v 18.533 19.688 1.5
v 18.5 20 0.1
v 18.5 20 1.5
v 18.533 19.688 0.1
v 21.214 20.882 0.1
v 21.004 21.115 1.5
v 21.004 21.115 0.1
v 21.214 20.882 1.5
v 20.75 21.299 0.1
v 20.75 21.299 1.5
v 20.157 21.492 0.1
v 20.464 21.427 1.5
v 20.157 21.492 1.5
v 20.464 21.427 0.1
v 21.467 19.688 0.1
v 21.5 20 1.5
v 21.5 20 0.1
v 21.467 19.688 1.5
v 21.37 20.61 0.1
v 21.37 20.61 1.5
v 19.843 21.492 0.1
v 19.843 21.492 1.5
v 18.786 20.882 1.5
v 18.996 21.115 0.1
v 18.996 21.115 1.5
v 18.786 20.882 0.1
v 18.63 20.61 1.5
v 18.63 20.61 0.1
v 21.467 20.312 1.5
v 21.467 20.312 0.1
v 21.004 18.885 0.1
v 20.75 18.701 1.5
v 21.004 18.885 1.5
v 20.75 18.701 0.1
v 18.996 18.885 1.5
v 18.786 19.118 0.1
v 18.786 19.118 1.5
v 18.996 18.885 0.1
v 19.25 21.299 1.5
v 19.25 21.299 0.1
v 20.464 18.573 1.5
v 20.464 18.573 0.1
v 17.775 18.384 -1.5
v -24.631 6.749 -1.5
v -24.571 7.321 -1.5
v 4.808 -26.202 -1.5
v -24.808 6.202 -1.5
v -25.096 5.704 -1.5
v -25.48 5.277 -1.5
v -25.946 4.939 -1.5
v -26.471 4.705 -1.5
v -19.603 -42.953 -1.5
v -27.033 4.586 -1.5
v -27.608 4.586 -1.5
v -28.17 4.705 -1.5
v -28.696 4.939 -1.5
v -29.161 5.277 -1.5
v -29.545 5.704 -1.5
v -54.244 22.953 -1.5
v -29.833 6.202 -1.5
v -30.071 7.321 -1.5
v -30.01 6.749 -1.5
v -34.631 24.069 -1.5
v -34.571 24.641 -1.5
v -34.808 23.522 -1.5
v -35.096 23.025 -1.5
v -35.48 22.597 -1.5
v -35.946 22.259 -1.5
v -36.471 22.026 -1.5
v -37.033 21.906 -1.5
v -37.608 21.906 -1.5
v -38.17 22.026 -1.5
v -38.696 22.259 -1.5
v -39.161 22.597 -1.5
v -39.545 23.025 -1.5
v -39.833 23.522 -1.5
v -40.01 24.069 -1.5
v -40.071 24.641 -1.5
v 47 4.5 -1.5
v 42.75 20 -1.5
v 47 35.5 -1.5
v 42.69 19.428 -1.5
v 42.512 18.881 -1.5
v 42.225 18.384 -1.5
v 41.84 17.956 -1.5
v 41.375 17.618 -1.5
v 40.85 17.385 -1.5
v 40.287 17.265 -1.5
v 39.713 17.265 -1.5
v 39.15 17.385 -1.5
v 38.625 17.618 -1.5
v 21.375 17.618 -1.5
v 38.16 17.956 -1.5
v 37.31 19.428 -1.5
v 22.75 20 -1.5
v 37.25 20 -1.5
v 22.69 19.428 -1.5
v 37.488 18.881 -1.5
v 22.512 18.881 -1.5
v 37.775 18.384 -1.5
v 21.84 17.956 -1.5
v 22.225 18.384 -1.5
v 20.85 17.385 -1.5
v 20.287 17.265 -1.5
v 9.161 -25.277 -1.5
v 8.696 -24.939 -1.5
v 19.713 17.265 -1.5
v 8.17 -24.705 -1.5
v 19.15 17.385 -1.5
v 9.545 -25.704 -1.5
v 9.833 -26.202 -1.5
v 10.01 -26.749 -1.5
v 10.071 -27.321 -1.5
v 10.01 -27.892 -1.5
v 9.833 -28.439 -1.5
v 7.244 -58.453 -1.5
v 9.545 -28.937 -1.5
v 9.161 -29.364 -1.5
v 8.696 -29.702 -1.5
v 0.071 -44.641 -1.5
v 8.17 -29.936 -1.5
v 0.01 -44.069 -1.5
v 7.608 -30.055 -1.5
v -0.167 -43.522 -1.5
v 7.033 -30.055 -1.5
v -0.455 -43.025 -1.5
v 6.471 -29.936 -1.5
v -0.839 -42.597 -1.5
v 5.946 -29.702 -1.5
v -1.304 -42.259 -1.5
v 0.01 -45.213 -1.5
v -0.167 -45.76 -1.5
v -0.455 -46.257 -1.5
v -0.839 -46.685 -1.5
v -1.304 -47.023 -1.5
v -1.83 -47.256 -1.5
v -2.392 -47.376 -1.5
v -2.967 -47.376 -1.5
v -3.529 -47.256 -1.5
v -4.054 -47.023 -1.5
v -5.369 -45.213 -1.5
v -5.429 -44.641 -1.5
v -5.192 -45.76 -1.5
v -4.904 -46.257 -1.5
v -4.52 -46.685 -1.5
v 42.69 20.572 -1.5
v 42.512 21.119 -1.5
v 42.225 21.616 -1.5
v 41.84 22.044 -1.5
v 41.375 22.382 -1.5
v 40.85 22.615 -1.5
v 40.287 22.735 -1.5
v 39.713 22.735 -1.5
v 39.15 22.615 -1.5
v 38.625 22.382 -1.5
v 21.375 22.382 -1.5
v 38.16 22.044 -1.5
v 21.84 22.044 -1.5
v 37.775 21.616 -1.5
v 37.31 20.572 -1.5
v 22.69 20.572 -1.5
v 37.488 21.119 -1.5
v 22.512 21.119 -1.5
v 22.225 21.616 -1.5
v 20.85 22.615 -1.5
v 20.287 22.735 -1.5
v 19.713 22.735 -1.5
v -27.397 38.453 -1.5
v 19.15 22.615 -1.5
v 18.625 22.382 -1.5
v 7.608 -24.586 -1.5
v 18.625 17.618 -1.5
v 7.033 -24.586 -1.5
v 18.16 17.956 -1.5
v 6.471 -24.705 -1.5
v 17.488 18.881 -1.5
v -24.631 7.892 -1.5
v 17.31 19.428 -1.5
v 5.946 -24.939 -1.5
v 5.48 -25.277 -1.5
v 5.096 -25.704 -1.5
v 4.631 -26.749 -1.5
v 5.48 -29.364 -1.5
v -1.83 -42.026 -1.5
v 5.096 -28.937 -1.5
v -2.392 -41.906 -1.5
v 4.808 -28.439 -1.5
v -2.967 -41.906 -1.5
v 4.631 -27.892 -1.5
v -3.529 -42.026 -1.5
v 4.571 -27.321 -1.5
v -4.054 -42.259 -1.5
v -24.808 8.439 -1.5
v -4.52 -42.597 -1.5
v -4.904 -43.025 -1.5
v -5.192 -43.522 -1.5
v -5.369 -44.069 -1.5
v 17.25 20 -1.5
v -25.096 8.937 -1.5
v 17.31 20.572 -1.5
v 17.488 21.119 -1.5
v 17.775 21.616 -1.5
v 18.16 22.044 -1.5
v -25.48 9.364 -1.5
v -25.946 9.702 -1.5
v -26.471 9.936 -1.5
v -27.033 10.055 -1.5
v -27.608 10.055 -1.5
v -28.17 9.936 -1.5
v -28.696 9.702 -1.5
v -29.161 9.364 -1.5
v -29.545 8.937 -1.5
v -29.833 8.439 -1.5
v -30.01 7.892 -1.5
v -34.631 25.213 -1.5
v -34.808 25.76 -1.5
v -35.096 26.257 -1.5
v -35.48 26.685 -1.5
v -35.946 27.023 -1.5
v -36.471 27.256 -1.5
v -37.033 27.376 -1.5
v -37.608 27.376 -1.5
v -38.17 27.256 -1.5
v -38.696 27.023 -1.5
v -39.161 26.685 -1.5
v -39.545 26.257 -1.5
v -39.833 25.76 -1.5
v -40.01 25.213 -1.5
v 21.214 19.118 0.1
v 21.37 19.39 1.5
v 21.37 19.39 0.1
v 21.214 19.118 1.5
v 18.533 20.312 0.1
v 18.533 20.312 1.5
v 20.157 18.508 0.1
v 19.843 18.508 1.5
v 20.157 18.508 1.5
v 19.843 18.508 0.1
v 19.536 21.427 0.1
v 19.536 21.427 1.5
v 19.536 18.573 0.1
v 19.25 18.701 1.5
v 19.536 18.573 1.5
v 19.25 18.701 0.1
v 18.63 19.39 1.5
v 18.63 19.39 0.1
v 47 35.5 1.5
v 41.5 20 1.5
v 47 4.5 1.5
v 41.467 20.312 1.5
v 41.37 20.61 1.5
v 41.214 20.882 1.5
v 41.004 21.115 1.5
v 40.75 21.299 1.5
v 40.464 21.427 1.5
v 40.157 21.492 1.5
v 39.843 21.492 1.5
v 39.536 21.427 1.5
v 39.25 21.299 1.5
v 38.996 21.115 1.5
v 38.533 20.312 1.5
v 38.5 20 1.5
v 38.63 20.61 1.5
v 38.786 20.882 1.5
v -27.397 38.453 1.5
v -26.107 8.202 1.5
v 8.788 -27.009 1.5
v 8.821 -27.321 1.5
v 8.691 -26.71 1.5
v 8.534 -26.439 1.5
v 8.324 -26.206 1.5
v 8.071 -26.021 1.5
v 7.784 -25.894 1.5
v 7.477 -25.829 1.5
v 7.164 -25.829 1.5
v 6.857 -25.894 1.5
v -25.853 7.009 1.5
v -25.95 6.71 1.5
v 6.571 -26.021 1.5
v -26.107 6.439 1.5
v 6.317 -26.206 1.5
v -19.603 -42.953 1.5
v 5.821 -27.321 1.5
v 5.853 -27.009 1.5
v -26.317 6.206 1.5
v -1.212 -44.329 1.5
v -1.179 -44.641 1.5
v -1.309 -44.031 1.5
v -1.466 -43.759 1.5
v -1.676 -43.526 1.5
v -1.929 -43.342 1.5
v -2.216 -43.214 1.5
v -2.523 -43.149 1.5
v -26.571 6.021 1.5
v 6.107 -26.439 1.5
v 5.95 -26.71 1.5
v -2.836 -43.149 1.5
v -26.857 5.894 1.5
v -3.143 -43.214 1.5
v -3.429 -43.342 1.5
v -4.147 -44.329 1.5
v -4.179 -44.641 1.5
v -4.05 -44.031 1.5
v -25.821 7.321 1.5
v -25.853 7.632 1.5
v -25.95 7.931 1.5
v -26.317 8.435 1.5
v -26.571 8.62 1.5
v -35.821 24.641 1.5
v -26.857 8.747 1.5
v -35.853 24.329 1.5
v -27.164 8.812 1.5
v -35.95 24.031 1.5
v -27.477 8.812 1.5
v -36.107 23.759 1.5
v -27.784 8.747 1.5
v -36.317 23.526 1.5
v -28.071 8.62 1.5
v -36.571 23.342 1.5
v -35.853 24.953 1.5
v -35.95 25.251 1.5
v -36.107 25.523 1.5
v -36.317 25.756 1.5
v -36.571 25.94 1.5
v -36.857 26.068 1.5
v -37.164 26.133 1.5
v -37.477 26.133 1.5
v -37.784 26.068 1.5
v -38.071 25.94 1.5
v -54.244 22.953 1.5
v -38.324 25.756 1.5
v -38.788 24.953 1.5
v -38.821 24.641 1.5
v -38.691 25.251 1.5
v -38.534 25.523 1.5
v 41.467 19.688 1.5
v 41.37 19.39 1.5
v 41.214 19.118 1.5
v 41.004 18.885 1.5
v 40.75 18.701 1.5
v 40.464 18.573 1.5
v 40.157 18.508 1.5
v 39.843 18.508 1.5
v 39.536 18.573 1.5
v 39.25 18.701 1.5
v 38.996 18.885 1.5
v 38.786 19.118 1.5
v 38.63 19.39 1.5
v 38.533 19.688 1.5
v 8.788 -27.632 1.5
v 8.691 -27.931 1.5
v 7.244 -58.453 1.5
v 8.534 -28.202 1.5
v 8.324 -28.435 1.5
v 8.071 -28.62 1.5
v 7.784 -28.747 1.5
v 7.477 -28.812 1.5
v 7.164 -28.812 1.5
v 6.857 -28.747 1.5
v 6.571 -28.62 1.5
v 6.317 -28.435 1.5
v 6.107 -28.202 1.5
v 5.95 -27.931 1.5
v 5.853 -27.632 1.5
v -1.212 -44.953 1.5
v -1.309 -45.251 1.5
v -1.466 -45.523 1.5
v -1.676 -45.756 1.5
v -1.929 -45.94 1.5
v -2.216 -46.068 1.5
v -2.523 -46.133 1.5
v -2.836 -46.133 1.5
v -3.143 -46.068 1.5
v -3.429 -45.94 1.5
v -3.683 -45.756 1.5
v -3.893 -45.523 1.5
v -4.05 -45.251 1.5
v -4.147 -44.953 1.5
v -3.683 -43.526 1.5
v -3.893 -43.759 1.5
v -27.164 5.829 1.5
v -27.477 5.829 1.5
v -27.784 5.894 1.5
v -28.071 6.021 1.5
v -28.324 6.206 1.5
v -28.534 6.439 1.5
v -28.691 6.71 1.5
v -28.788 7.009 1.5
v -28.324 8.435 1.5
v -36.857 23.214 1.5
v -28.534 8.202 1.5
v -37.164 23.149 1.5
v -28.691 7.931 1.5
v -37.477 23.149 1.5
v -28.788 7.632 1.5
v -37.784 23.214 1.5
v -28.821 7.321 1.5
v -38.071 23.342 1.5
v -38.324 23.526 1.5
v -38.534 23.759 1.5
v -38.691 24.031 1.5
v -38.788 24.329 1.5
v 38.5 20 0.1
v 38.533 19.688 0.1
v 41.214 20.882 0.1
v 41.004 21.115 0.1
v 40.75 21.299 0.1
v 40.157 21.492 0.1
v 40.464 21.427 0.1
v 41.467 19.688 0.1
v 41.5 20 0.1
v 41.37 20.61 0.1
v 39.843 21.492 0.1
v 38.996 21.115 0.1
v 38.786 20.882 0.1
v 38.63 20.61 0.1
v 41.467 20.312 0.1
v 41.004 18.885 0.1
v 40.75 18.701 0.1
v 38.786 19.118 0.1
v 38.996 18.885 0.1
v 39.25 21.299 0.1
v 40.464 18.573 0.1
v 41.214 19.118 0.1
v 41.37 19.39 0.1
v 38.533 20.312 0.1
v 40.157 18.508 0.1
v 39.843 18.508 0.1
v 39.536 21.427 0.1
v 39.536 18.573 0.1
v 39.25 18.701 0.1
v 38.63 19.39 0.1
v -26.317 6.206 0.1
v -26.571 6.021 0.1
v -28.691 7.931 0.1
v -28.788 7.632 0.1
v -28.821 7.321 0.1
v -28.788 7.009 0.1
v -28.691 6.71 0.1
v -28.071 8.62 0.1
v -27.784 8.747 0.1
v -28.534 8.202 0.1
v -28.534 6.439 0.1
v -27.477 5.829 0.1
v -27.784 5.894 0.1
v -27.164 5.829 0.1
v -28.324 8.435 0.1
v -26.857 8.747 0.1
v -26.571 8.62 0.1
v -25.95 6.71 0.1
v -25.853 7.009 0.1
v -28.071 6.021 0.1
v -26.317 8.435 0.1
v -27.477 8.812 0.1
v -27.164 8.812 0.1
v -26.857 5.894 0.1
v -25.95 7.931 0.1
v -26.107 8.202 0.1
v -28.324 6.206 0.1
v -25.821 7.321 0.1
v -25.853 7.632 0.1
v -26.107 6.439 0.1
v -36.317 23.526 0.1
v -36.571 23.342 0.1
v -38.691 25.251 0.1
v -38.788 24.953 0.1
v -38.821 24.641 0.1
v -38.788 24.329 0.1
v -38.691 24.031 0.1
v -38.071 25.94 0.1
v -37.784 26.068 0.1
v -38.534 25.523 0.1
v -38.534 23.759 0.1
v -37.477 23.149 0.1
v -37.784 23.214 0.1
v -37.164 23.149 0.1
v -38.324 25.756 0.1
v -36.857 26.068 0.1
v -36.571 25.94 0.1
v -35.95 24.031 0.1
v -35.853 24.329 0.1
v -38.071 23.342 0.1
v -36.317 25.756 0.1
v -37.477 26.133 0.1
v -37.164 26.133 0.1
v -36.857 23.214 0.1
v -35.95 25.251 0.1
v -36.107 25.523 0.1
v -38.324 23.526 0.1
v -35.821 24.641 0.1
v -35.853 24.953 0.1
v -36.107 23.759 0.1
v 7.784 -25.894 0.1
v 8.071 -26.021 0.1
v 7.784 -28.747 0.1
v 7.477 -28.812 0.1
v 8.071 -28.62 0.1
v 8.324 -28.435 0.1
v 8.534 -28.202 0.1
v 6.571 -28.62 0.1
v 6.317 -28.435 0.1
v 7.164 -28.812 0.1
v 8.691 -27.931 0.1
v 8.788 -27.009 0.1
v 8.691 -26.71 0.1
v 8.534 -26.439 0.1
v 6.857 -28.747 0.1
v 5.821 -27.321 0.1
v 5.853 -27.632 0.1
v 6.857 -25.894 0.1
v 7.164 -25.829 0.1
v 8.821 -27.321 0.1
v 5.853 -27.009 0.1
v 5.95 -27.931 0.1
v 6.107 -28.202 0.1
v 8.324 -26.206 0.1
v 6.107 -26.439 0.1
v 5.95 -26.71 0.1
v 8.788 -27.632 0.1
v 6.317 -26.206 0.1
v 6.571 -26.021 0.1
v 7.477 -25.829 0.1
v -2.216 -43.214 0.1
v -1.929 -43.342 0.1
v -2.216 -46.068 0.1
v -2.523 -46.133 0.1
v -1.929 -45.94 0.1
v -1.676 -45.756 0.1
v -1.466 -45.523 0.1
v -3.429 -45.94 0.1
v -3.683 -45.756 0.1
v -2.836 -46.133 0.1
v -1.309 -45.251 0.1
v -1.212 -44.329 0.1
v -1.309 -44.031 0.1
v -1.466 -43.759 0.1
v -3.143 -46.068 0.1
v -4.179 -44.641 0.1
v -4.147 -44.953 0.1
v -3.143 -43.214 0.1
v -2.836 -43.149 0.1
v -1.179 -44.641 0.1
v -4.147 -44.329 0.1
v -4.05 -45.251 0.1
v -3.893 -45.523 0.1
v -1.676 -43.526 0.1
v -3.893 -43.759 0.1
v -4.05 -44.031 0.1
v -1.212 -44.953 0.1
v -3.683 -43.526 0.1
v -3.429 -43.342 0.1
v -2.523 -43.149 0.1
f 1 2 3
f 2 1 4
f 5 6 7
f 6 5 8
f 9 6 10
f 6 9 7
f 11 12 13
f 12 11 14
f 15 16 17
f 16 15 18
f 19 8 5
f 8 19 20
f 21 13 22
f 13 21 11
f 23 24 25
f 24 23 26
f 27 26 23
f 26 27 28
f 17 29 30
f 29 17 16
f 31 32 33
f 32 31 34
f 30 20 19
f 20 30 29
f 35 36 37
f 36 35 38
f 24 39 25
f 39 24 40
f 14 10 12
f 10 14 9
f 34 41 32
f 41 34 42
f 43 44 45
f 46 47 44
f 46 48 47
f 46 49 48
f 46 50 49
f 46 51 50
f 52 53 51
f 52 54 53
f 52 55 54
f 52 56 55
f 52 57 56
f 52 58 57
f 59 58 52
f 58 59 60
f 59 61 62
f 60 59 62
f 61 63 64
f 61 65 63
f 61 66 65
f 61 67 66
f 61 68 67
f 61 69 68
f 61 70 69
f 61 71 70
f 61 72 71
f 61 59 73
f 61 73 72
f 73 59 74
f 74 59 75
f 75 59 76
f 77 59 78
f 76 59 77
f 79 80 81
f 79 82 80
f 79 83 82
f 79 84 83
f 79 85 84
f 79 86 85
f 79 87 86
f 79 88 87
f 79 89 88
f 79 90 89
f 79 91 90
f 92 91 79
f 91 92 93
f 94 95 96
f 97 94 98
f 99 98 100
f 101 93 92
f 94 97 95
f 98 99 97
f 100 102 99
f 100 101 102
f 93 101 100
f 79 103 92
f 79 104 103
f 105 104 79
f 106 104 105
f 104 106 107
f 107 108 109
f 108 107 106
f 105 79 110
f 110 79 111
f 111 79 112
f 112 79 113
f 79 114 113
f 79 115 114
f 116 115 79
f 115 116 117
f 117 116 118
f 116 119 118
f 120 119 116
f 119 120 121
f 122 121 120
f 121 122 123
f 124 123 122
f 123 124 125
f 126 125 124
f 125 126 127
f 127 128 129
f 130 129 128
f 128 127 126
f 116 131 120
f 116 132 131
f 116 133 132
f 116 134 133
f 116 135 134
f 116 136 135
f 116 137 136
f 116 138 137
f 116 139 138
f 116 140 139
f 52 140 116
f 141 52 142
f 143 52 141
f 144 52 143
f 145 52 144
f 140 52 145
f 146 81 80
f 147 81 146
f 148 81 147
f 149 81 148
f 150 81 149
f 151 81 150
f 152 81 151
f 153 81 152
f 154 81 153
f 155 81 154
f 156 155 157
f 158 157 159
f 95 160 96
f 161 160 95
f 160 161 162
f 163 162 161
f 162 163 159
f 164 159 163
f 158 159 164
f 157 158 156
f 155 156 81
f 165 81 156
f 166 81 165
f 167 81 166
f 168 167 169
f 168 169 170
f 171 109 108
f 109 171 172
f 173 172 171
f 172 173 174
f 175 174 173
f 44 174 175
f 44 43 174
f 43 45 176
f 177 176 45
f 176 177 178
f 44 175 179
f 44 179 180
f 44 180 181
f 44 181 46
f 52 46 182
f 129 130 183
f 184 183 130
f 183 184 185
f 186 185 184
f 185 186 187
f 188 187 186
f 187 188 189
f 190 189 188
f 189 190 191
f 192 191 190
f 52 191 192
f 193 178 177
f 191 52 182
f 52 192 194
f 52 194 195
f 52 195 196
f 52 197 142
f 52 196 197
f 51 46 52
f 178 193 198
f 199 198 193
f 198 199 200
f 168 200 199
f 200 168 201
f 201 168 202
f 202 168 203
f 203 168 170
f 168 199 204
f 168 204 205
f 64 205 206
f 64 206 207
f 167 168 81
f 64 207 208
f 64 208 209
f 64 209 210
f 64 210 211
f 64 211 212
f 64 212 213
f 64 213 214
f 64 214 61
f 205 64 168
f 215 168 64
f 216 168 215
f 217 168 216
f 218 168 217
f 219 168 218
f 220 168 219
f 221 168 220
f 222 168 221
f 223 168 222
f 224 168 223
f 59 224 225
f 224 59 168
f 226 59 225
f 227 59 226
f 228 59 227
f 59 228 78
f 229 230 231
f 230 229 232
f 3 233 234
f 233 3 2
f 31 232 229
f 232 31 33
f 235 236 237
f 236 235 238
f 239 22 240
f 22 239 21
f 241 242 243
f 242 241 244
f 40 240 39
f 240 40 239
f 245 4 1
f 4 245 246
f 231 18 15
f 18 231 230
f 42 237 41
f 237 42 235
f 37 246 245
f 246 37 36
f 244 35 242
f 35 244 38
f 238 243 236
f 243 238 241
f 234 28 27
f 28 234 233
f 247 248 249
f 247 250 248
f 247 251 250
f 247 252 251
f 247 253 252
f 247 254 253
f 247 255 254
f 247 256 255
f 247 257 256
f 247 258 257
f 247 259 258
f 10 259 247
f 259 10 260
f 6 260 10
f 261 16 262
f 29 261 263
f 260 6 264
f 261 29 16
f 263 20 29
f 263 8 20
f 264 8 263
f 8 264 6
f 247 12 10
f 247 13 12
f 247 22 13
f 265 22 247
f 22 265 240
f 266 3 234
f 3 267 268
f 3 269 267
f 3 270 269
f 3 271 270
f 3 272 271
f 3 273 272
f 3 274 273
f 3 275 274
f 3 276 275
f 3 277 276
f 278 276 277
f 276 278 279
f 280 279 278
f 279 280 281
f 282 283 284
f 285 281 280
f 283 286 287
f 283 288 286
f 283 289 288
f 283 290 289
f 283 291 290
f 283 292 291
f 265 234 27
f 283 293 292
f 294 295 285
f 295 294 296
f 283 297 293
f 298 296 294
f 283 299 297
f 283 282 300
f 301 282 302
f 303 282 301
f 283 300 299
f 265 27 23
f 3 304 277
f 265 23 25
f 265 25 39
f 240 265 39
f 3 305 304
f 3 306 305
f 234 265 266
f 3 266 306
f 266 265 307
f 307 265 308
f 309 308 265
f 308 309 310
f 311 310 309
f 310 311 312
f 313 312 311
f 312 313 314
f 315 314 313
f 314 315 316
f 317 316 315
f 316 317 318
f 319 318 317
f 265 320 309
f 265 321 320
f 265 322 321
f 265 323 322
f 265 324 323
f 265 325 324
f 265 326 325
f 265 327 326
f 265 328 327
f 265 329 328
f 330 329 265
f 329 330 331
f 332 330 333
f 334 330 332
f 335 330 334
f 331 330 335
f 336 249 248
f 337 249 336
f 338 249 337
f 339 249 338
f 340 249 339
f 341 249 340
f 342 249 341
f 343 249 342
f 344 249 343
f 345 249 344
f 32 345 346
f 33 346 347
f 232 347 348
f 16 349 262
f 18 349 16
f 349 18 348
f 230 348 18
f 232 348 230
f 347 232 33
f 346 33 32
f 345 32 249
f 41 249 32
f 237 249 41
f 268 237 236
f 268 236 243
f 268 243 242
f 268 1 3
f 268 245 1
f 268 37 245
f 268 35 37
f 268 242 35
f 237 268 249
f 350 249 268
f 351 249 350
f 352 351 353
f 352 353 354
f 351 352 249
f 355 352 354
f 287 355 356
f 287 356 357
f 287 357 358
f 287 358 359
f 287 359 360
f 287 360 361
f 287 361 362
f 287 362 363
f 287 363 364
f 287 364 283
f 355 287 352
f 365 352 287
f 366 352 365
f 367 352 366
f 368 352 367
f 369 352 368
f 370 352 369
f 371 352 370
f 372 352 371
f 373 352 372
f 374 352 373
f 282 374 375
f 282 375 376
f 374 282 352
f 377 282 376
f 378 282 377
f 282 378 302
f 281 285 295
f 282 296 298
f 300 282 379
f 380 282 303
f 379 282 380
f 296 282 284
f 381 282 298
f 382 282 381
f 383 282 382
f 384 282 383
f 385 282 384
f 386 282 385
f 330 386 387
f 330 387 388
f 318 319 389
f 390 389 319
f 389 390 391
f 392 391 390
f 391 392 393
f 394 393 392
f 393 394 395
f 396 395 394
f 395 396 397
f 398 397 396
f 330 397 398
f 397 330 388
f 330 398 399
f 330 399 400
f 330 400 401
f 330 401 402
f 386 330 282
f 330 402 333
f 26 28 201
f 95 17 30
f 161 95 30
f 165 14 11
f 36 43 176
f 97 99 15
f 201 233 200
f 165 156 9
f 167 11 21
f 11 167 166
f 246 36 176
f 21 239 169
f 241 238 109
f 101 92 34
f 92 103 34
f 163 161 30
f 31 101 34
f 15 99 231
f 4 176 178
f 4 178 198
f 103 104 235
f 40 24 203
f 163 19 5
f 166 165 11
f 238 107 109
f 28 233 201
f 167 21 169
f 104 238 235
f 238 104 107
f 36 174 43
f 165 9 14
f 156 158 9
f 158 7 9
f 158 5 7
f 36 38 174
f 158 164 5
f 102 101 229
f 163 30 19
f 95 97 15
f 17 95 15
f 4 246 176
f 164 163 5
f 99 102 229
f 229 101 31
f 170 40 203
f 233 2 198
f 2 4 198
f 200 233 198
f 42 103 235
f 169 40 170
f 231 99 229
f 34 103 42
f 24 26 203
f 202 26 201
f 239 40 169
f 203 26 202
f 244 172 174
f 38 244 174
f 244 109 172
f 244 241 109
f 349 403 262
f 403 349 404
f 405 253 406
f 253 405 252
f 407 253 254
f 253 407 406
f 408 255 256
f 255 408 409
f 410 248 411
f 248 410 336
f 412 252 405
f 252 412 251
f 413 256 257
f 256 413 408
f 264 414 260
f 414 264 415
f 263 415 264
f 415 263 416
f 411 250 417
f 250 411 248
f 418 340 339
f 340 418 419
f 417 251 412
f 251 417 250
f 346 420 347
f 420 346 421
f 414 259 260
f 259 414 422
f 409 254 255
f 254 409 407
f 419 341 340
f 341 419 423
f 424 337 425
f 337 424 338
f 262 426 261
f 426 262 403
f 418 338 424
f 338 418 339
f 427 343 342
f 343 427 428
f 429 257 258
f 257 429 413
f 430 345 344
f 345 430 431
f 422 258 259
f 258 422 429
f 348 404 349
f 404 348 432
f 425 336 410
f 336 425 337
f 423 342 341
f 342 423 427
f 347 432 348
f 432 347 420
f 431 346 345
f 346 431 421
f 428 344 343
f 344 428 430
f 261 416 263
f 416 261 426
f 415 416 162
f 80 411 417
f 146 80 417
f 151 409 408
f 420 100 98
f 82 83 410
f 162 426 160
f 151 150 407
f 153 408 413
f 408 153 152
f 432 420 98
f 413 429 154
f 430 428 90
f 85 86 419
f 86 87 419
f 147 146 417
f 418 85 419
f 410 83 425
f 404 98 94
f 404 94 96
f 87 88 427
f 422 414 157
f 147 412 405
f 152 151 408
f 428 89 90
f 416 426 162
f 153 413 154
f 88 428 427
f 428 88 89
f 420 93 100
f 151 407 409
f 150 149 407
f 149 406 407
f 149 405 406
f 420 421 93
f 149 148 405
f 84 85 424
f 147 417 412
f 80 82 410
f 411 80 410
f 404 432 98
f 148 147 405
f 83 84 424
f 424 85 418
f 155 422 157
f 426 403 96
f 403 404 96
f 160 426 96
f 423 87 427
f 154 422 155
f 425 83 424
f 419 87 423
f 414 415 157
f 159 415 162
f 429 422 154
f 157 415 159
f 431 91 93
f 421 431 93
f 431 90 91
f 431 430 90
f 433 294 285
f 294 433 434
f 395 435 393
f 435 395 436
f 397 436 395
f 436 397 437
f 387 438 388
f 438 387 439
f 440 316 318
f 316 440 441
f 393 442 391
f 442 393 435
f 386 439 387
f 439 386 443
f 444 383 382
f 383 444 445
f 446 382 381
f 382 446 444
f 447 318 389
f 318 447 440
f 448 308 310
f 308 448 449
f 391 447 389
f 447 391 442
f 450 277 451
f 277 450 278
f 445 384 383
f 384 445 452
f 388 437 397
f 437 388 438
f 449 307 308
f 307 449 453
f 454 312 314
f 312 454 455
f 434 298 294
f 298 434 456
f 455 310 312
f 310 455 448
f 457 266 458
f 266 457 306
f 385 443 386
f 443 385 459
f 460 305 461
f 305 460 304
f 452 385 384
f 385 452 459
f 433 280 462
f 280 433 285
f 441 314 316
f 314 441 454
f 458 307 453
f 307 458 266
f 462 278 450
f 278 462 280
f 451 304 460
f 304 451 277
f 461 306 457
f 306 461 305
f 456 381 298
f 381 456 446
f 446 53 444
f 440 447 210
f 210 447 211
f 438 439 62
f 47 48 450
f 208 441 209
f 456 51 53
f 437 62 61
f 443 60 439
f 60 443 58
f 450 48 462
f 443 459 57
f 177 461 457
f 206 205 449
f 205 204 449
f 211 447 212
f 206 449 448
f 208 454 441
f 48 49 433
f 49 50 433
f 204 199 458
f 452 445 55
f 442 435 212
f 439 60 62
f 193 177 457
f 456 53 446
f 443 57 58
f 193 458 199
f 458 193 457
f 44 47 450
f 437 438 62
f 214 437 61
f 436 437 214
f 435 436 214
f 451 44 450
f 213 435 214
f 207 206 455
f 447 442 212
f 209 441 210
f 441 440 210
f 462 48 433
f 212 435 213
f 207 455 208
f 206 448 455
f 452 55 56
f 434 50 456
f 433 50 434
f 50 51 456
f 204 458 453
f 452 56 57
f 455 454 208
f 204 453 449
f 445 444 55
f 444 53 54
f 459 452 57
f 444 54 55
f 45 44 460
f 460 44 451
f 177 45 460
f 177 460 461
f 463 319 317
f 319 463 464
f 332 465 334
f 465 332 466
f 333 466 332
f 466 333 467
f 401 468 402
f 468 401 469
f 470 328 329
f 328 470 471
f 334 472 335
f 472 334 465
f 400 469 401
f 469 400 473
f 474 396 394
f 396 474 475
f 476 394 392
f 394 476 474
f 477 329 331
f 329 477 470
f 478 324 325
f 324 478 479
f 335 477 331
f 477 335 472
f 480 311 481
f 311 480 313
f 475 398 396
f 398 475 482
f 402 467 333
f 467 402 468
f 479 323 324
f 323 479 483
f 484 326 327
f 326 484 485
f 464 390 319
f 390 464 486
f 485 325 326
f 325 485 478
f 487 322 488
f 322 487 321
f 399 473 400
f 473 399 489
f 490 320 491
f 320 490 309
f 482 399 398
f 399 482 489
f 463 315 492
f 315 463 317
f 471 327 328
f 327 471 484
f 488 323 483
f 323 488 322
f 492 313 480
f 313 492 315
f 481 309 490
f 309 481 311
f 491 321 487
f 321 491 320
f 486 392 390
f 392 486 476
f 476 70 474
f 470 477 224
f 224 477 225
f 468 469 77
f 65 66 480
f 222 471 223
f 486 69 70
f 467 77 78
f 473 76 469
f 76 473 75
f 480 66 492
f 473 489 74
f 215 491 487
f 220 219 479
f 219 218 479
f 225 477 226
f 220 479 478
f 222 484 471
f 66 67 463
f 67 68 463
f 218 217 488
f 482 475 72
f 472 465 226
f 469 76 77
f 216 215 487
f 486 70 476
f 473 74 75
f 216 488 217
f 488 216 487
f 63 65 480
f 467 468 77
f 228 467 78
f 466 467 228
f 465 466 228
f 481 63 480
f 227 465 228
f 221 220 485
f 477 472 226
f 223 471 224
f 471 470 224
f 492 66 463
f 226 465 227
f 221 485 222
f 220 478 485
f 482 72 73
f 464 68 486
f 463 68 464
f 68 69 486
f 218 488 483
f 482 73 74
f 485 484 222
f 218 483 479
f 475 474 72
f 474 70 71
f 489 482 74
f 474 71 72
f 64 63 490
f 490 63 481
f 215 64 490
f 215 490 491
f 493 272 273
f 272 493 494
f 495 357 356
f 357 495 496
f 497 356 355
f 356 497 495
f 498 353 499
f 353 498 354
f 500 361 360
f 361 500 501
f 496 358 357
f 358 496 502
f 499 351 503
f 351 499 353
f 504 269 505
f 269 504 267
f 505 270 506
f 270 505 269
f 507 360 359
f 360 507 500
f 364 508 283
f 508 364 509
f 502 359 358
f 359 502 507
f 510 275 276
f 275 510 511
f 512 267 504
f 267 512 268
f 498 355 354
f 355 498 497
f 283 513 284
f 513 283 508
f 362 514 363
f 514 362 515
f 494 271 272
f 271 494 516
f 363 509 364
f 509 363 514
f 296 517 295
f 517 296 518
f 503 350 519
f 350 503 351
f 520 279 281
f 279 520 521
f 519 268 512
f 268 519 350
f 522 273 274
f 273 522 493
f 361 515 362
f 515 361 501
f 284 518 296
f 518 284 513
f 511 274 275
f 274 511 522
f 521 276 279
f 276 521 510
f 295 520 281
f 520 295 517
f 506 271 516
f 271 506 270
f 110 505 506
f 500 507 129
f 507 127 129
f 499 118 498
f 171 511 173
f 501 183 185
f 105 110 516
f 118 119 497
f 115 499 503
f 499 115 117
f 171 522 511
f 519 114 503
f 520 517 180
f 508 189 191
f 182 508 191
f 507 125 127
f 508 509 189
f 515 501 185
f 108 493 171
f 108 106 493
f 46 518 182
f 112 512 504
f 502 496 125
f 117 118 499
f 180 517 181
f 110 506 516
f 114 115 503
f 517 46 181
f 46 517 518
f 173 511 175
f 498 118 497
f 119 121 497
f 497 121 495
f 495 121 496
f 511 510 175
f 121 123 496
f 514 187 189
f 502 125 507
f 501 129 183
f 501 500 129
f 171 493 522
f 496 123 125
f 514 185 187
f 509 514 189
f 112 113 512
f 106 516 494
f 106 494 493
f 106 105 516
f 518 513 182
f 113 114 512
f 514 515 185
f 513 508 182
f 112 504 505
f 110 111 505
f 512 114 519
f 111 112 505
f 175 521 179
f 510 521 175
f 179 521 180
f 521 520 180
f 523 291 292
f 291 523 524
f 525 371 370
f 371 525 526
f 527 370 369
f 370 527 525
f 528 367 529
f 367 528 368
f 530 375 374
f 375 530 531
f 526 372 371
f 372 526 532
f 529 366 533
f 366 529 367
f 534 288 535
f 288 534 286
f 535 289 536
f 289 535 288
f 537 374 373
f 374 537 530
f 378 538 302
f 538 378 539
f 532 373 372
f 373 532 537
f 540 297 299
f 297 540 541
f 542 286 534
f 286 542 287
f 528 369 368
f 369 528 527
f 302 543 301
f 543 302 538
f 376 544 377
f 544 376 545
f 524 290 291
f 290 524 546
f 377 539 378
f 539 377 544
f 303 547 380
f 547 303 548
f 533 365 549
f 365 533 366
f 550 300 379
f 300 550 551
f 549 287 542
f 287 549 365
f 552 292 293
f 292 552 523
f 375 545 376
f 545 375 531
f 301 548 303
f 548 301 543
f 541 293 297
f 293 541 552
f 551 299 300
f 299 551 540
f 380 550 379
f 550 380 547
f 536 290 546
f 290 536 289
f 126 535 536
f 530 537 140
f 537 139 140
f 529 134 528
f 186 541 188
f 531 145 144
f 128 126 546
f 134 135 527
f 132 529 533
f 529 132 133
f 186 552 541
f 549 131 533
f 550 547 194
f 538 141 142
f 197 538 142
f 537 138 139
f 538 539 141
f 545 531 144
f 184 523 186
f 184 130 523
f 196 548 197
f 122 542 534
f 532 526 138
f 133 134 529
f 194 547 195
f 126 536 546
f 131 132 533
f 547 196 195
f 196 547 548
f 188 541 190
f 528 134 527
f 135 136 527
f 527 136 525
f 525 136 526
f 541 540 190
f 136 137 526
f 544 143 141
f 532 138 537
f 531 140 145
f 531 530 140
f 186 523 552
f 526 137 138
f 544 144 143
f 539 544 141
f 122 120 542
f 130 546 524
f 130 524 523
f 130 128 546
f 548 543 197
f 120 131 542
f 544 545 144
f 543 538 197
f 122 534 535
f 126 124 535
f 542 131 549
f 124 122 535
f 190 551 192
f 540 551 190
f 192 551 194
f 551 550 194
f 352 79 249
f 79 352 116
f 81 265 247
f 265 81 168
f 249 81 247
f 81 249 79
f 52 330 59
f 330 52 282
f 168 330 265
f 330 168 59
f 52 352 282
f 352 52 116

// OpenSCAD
$fn = 30;
m3 = 3;
d = 20;
t = 3;

module countersink_m3() {
   translate([0,0,-t/2]) cylinder(d=m3, h=t);
   translate([0,0,t/2-1.6]) cylinder(h=1.6, r1=5.5, r2=m3);
}

module countersink_m3_bottom() {
   translate([0,0,-t/2]) cylinder(d=m3, h=t);
   translate([0,0,-t/2]) cylinder(h=1.6, d2=3.0, d1=5.5);
}

module plate() {
  cube([34,31,t], center=true);
}

module holes() {
  translate([-d/2, 0]) countersink_m3_bottom();
  translate([d/2, 0]) countersink_m3_bottom();
}


difference() {
hull() {
for(i = [0:2]) {
  rotate([0,0,i*120]) translate([30, 20]) plate();
 }
}
for(i = [0:2]) {
  rotate([0,0,i*120]) translate([30, 20]) holes();
}
}
